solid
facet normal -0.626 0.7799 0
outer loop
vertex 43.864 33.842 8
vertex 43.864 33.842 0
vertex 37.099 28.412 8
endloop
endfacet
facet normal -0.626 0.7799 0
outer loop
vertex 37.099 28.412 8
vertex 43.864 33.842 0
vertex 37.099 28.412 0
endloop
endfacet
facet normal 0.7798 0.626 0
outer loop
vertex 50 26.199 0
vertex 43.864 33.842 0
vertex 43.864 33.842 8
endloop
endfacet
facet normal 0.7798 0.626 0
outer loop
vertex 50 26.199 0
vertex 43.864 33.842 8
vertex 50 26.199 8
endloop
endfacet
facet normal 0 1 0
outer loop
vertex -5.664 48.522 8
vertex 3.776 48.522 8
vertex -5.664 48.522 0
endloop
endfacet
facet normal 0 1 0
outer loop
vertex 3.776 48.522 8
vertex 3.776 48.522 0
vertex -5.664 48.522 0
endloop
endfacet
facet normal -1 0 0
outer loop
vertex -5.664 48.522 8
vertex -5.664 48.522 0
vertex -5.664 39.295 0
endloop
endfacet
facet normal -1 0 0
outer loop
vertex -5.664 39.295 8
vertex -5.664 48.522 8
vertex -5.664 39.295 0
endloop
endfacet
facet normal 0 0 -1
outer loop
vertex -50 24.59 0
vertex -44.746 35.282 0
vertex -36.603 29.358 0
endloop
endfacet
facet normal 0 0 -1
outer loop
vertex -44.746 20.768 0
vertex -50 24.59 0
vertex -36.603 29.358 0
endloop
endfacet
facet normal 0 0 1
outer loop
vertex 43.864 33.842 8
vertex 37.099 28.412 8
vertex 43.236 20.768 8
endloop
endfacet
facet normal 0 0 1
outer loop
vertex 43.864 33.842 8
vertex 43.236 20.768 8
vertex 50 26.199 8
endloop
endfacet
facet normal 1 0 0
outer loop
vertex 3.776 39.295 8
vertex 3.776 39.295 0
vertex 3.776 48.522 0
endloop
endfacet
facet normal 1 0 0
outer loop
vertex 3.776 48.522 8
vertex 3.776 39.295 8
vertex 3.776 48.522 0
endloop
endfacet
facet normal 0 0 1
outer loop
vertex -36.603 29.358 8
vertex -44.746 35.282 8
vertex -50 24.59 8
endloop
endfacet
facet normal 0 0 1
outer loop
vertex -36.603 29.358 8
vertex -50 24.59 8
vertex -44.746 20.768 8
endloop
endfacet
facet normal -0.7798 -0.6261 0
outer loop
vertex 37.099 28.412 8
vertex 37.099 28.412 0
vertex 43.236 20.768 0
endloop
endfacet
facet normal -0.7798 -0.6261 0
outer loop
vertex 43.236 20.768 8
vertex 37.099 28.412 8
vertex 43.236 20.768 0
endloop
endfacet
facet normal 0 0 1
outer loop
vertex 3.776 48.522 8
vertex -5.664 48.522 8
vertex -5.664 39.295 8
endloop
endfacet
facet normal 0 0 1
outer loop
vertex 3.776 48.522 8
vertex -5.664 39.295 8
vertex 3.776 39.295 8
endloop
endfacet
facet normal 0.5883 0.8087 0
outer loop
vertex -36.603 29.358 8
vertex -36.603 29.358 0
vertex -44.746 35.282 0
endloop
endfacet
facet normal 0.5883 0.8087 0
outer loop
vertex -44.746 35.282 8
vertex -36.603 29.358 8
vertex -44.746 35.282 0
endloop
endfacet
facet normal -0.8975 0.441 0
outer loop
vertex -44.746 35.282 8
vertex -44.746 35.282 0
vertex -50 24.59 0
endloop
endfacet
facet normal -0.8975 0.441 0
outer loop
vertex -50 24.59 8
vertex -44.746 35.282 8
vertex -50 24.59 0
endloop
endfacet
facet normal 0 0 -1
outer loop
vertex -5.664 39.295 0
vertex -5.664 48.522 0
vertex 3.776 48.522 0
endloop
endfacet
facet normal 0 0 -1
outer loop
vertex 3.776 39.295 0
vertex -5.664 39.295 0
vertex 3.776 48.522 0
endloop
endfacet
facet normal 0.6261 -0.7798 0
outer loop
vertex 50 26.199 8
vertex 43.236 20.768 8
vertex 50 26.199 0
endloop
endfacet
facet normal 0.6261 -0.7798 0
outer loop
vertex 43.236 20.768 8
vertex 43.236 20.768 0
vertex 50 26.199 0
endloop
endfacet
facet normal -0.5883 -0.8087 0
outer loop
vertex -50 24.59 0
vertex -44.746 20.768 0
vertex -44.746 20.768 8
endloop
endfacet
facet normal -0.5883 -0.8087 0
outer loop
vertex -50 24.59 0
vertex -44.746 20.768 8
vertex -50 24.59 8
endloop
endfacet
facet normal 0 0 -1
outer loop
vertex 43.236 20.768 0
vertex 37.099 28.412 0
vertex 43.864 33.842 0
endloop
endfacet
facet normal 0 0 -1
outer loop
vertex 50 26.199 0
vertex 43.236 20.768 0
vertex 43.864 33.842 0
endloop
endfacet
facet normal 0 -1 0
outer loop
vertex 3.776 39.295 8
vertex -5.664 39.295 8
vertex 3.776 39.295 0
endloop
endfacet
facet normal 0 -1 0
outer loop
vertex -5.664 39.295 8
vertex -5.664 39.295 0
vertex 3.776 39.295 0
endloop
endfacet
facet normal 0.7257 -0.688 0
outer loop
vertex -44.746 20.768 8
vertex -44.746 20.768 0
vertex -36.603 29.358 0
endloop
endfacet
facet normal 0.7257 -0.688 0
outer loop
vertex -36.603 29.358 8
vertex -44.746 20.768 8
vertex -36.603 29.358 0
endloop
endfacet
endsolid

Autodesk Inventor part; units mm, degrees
ref_plane "YZ Plane" through (0, 0, 0) normal (1, 0, 0) x (0, 1, 0)
ref_plane "XZ Plane" through (0, 0, 0) normal (0, 1, 0) x (-1, 0, 0)
ref_plane "XY Plane" through (0, 0, 0) normal (0, 0, 1) x (1, 0, 0)
sketch "Sketch1" plane through (0, 0, 0) normal (0, 0, 1) x (1, 0, 0)
  line L0 (25, -7) -> (50, -7) projected
  line L1 (50, 45.5218) -> (50, -7) projected
  line L2 (50, 45.5218) -> (11.4158, 45.5218) projected
  line L3 (11.4158, 45.5218) -> (11.4158, 48.5218) projected
  line L4 (11.4158, 48.5218) -> (-11.4158, 48.5218) projected
  line L5 (-11.4158, 48.5218) -> (-11.4158, 45.5218) projected
  line L6 (-11.4158, 45.5218) -> (-50, 45.5218) projected
  line L7 (-50, 45.5218) -> (-50, -7) projected
  line L8 (-50, -7) -> (-25, -7) projected
  line L9 (-25, -7) -> (-25, -24) projected
  line L10 (-25, -24) -> (-32.4371, -24) projected
  line L11 (-32.4371, -24) -> (-32.4371, -28) projected
  line L12 (-32.4371, -28) -> (-25, -28) projected
  line L13 (-25, -28) -> (-25, -35) projected
  line L14 (-25, -35) -> (25, -35) projected
  line L15 (25, -35) -> (25, -28) projected
  line L16 (25, -28) -> (30.7079, -28) projected
  line L17 (30.7079, -28) -> (30.7079, -24) projected
  line L18 (30.7079, -24) -> (25, -24) projected
  line L19 (25, -24) -> (25, -7) projected
  circle A0 centre (-11.4158, 26.1989) radius 1.6 projected
  circle A1 centre (20.9961, 37.6953) radius 1.6 projected
  circle A2 centre (-20.9961, 37.6953) radius 1.6 projected
  circle A3 centre (11.4158, 26.1989) radius 1.6 projected
  line L20 (3.7761, 48.5218) -> (-5.6641, 48.5218)
  line L21 (-5.6641, 48.5218) -> (-5.6641, 39.2953)
  line L22 (-5.6641, 39.2953) -> (3.7761, 39.2953)
  line L23 (3.7761, 39.2953) -> (3.7761, 48.5218)
  line L24 (50, -35) -> (50, 20.7683) projected
  line L25 (50, 20.7683) -> (-50, 20.7683) projected
  line L26 (-50, 20.7683) -> (-50, -35) projected
  line L27 (-50, -35) -> (50, -35) projected
  line L28 (43.2359, 20.7683) -> (50, 26.1989)
  line L29 (43.8636, 33.8422) -> (50, 26.1989)
  line L30 (43.8636, 33.8422) -> (37.0994, 28.4116)
  line L31 (37.0994, 28.4116) -> (43.2359, 20.7683)
  line L32 (-44.7463, 20.7683) -> (-36.6029, 29.3579)
  line L33 (-36.6029, 29.3579) -> (-44.7463, 35.2815)
  line L34 (-44.7463, 35.2815) -> (-50, 24.59)
  line L35 (-44.7463, 20.7683) -> (-50, 24.59)
  point P0 (0, 0)
extrude "Extrusion1" add sketch "Sketch1" along normal blind 8 contours L28 L31 L30 L29 | L35 L34 L33 L32 | L23 L22 L21 L4
properties material "PET Plastic"
